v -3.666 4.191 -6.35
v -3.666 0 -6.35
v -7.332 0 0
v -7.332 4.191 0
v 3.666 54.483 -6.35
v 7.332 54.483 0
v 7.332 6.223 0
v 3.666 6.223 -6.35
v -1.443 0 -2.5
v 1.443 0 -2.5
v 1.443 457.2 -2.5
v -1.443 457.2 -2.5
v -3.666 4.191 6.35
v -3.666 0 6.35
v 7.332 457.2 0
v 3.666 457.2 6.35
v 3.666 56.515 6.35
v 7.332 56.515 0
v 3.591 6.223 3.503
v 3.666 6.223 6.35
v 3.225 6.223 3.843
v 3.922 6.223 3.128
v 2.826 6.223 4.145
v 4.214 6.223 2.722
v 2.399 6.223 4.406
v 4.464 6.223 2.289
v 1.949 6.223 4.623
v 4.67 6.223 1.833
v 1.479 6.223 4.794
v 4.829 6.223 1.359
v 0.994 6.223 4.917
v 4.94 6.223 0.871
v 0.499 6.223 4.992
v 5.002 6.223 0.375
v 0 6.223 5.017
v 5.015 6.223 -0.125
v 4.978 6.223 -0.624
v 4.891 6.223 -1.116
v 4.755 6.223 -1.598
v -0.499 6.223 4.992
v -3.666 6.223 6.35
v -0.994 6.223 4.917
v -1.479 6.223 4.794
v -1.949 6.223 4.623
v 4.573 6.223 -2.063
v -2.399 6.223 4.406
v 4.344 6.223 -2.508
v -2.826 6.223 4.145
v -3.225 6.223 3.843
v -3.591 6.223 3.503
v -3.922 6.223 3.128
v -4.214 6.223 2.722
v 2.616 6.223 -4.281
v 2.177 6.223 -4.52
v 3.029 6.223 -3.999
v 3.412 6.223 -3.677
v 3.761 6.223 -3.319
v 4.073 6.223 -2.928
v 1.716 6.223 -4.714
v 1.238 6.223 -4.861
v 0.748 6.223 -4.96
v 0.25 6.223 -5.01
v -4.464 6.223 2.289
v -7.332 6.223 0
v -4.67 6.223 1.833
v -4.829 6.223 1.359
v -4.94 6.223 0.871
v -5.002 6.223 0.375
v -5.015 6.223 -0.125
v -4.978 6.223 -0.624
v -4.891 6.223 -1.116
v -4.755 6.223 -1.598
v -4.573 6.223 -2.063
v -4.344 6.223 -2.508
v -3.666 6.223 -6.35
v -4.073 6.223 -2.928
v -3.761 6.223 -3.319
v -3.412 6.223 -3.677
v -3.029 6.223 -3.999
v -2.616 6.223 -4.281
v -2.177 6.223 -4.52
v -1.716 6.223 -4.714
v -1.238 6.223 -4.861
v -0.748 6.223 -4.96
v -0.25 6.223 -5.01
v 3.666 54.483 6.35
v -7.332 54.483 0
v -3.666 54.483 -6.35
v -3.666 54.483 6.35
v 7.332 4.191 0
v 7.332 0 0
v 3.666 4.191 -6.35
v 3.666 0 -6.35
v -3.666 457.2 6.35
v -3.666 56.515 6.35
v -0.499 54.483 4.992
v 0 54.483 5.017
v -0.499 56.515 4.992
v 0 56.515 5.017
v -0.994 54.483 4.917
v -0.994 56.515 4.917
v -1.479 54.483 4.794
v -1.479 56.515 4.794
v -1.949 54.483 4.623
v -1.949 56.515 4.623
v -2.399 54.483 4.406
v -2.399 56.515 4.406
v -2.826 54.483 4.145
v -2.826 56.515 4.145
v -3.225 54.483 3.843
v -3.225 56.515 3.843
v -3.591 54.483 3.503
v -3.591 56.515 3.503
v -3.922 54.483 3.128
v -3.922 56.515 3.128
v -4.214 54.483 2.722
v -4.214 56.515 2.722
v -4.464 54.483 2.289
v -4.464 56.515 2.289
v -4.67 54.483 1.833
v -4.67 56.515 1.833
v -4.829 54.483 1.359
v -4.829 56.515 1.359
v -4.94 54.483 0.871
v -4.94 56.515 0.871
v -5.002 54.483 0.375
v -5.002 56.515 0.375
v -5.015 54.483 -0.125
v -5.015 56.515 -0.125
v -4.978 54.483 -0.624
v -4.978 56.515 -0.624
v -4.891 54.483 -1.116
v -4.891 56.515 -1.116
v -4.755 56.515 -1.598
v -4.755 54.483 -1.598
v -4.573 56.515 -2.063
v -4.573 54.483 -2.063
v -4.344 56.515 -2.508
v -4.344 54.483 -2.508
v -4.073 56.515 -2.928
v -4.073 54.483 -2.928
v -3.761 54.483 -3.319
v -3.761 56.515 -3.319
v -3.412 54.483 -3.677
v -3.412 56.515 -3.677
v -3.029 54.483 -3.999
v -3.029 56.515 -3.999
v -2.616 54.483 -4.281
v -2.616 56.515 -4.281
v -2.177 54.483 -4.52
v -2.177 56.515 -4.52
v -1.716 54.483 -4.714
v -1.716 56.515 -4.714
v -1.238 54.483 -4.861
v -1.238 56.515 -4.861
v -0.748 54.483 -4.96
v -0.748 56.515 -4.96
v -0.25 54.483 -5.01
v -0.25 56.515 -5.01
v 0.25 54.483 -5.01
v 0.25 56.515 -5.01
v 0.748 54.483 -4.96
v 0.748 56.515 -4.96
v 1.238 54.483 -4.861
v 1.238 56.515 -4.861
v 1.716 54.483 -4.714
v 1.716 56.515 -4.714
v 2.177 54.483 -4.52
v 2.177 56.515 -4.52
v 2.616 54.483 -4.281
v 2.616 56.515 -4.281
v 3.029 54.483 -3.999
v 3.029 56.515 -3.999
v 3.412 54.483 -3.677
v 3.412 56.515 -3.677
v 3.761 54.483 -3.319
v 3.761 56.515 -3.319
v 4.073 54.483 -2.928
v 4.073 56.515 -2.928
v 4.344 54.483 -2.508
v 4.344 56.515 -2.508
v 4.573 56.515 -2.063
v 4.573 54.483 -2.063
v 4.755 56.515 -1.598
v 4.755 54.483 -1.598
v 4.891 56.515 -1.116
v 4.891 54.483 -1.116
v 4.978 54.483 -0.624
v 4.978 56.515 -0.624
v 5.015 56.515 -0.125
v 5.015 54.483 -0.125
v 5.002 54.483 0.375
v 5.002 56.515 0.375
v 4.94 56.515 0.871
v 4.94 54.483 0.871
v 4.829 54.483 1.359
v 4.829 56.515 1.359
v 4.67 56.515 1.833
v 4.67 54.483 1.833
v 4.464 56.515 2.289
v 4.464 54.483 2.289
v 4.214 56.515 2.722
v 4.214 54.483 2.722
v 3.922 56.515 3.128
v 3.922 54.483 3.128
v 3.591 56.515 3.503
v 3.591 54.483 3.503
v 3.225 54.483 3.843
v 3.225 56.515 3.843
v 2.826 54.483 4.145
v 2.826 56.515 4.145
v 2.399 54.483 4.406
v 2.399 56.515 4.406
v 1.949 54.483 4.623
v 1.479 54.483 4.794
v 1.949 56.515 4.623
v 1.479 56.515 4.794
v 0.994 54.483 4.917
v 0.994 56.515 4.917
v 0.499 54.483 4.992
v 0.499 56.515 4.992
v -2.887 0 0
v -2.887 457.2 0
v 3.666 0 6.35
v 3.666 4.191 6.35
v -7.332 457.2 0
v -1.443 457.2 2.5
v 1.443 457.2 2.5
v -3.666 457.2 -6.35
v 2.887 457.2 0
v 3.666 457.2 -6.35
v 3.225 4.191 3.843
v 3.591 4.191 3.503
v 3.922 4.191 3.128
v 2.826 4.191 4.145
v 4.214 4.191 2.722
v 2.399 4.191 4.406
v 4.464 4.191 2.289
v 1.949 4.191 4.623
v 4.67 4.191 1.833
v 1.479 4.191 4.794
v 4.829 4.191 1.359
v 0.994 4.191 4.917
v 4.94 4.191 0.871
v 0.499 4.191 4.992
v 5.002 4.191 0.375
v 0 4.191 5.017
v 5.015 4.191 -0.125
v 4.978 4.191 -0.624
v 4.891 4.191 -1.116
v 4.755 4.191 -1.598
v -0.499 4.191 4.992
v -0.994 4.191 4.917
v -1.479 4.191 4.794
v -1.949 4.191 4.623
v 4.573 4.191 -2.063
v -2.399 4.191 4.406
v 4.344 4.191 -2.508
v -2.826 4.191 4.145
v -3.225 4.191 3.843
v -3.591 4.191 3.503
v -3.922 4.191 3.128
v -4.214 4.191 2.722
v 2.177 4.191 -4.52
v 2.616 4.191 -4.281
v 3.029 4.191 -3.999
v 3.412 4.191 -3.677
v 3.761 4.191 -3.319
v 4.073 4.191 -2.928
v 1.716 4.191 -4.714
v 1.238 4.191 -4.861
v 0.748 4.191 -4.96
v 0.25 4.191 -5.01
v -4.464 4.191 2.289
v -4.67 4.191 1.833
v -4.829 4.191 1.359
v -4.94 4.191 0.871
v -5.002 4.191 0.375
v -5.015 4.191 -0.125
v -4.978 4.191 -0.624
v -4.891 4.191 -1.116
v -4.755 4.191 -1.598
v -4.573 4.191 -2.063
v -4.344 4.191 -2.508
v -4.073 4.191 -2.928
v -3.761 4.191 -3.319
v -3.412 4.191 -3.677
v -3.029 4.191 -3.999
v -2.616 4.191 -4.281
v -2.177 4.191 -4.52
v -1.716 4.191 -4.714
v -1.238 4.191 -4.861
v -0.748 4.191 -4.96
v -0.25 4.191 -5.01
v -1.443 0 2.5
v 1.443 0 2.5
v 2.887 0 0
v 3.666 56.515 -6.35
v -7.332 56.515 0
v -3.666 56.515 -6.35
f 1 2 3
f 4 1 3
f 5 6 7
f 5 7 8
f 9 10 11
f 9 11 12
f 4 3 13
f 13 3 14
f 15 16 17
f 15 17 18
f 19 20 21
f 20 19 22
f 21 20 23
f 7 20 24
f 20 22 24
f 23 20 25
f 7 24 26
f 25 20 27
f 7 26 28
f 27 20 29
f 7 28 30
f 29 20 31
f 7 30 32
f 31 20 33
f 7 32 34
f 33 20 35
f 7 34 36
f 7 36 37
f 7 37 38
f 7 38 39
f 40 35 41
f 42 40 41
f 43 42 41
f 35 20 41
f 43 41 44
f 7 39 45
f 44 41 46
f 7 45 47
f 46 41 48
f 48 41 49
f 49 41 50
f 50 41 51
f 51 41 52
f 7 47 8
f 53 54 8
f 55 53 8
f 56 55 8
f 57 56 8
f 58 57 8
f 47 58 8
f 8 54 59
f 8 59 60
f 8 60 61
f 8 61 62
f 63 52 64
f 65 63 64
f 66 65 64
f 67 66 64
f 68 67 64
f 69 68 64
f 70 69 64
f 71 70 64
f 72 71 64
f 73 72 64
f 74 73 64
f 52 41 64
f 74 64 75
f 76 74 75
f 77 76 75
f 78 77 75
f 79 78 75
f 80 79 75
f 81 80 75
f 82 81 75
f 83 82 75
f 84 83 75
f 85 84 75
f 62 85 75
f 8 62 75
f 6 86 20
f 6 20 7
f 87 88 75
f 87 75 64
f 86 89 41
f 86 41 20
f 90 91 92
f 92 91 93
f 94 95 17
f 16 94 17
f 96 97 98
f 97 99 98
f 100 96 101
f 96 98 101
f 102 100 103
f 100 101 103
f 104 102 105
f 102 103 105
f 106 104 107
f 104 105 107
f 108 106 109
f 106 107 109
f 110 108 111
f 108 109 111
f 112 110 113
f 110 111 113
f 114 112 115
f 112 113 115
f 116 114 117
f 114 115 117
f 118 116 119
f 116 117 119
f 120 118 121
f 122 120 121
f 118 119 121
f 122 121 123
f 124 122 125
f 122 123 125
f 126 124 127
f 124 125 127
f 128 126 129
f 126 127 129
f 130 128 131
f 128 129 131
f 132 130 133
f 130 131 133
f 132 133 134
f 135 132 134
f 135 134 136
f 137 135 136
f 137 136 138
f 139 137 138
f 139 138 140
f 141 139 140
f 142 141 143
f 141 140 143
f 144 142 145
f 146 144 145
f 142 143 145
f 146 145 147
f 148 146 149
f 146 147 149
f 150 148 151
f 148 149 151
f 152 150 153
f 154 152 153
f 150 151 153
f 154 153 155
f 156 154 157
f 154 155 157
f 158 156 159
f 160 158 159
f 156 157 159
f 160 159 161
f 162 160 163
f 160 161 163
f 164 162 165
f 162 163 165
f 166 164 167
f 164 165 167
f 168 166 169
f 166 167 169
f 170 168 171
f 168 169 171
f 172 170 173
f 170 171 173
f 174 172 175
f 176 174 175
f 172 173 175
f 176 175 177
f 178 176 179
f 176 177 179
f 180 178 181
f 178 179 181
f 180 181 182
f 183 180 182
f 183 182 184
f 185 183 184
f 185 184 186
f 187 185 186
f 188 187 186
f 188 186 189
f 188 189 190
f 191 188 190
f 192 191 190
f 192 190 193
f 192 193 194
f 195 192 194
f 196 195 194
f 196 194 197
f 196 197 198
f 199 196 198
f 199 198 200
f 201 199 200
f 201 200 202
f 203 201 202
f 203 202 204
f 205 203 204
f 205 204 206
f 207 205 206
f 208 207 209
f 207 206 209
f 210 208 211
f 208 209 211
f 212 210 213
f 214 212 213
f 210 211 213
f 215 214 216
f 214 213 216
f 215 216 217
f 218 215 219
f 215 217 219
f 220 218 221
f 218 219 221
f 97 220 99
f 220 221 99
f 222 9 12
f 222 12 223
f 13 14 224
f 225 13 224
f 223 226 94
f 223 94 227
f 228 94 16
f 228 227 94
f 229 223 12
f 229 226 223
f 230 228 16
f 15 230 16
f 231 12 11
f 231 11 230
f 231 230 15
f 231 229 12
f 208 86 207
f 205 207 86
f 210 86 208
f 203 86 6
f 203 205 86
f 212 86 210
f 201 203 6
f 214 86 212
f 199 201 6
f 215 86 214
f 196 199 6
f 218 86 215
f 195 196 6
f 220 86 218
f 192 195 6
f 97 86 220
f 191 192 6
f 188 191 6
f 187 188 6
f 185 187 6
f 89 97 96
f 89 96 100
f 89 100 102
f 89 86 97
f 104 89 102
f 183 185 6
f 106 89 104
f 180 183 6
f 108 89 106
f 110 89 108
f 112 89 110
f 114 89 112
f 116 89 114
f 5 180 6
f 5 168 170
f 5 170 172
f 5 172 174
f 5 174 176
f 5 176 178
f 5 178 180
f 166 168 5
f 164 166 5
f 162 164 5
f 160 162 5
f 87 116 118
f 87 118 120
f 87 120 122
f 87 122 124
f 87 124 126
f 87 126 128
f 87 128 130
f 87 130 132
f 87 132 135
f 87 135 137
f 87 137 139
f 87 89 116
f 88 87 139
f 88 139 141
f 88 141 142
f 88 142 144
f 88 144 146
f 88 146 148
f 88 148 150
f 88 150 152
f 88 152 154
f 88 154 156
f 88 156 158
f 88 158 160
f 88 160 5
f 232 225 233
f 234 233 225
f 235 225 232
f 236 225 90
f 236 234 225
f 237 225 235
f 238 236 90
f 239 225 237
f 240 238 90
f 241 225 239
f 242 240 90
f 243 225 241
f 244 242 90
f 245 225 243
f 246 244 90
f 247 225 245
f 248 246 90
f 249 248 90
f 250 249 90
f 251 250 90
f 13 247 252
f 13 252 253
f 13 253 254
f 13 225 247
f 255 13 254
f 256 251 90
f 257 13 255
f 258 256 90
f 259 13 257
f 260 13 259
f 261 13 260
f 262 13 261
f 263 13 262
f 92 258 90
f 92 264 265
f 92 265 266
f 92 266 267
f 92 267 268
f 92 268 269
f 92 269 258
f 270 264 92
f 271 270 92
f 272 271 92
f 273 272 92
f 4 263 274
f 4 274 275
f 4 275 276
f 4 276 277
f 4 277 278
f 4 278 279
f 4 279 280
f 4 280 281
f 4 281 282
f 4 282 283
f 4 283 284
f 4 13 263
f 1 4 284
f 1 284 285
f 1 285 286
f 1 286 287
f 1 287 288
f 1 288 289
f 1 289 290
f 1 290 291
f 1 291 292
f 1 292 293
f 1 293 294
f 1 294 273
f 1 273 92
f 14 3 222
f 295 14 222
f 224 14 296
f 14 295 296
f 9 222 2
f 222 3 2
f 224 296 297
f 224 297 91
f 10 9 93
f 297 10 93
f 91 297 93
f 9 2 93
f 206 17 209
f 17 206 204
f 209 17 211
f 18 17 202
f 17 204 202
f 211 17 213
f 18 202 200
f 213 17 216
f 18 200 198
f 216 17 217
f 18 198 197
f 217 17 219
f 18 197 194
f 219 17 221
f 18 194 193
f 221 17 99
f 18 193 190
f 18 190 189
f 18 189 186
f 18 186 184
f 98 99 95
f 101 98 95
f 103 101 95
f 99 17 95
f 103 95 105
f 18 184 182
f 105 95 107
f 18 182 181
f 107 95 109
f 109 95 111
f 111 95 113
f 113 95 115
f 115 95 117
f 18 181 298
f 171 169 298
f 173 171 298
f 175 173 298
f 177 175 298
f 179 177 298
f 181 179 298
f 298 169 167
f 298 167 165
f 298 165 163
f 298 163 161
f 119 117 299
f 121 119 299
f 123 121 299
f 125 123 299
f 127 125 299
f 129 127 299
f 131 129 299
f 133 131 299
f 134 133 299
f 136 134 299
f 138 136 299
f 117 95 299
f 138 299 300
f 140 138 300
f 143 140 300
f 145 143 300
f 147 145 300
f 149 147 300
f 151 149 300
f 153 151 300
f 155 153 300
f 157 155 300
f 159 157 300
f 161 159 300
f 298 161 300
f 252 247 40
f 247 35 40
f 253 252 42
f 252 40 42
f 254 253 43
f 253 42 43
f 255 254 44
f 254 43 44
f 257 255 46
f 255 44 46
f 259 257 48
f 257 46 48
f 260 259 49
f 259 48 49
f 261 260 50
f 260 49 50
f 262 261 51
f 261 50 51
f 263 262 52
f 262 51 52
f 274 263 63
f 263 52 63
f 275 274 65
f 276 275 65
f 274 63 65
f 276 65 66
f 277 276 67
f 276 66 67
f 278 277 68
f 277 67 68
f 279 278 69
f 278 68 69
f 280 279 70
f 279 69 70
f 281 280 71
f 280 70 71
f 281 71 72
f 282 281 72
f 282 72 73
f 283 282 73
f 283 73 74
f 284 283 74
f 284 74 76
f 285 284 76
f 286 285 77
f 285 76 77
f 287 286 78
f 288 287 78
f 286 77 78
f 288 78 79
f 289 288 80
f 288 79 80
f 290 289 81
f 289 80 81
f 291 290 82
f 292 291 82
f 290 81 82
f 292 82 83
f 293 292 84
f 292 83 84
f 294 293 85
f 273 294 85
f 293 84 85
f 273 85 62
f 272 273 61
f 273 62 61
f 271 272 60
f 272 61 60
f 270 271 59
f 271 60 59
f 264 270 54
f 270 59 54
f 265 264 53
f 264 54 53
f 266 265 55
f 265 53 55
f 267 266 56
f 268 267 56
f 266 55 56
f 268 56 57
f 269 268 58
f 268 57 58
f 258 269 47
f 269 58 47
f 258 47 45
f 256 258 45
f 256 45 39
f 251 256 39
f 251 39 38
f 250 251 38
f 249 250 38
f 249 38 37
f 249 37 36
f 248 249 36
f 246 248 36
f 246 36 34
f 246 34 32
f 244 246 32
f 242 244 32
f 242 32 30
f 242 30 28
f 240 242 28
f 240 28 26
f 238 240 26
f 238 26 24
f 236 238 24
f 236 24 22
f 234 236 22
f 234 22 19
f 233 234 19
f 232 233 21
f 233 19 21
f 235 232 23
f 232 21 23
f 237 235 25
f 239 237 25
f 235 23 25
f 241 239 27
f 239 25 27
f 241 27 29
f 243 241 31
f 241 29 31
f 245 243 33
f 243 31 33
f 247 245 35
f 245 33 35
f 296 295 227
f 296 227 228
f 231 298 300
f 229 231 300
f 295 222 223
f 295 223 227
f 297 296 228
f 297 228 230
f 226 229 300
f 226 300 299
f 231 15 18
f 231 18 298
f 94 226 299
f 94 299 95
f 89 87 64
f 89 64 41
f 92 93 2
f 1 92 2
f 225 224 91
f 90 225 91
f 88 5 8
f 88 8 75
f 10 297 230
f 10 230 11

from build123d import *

# Parameters (mm, degrees)
BOSS_EXTRUDE1_DEPTH = 457.2
SKETCH3_W           = 2.54
SKETCH3_H           = 2.032


with BuildPart() as part:
    # Sketch1 → Boss-Extrude1 (new body)
    with BuildSketch(Plane(origin=(0, 0, 0), x_dir=(1, 0, 0), z_dir=(0, 1, 0))):
        Polygon((7.332348419, 0), (3.666174209, 6.35), (-3.666174209, 6.35), (-7.332348419, 0), (-3.666174209, -6.35), (3.666174209, -6.35), align=None)
        Polygon((1.443375673, 2.5), (-1.443375673, 2.5), (-2.886751346, 0), (-1.443375673, -2.5), (1.443375673, -2.5), (2.886751346, 0), align=None, mode=Mode.SUBTRACT)
    extrude(amount=BOSS_EXTRUDE1_DEPTH)

    # Sketch3 → Cut-Revolve2 (revolve, cut)
    with BuildSketch(Plane(origin=(0, 0, 0), x_dir=(0, 0, -1), z_dir=(1, 0, 0)), mode=Mode.PRIVATE) as cut_revolve2_sk:
        with Locations((6.2865, 55.499)):
            Rectangle(SKETCH3_W, SKETCH3_H)
        with Locations((6.2865, 5.207)):
            Rectangle(SKETCH3_W, SKETCH3_H)
    revolve(cut_revolve2_sk.sketch.rotate(Axis((0, 457.2, 0), (0, -1, 0)), 180), axis=Axis((0, 457.2, 0), (0, -1, 0)), mode=Mode.SUBTRACT)


solid = part.part
